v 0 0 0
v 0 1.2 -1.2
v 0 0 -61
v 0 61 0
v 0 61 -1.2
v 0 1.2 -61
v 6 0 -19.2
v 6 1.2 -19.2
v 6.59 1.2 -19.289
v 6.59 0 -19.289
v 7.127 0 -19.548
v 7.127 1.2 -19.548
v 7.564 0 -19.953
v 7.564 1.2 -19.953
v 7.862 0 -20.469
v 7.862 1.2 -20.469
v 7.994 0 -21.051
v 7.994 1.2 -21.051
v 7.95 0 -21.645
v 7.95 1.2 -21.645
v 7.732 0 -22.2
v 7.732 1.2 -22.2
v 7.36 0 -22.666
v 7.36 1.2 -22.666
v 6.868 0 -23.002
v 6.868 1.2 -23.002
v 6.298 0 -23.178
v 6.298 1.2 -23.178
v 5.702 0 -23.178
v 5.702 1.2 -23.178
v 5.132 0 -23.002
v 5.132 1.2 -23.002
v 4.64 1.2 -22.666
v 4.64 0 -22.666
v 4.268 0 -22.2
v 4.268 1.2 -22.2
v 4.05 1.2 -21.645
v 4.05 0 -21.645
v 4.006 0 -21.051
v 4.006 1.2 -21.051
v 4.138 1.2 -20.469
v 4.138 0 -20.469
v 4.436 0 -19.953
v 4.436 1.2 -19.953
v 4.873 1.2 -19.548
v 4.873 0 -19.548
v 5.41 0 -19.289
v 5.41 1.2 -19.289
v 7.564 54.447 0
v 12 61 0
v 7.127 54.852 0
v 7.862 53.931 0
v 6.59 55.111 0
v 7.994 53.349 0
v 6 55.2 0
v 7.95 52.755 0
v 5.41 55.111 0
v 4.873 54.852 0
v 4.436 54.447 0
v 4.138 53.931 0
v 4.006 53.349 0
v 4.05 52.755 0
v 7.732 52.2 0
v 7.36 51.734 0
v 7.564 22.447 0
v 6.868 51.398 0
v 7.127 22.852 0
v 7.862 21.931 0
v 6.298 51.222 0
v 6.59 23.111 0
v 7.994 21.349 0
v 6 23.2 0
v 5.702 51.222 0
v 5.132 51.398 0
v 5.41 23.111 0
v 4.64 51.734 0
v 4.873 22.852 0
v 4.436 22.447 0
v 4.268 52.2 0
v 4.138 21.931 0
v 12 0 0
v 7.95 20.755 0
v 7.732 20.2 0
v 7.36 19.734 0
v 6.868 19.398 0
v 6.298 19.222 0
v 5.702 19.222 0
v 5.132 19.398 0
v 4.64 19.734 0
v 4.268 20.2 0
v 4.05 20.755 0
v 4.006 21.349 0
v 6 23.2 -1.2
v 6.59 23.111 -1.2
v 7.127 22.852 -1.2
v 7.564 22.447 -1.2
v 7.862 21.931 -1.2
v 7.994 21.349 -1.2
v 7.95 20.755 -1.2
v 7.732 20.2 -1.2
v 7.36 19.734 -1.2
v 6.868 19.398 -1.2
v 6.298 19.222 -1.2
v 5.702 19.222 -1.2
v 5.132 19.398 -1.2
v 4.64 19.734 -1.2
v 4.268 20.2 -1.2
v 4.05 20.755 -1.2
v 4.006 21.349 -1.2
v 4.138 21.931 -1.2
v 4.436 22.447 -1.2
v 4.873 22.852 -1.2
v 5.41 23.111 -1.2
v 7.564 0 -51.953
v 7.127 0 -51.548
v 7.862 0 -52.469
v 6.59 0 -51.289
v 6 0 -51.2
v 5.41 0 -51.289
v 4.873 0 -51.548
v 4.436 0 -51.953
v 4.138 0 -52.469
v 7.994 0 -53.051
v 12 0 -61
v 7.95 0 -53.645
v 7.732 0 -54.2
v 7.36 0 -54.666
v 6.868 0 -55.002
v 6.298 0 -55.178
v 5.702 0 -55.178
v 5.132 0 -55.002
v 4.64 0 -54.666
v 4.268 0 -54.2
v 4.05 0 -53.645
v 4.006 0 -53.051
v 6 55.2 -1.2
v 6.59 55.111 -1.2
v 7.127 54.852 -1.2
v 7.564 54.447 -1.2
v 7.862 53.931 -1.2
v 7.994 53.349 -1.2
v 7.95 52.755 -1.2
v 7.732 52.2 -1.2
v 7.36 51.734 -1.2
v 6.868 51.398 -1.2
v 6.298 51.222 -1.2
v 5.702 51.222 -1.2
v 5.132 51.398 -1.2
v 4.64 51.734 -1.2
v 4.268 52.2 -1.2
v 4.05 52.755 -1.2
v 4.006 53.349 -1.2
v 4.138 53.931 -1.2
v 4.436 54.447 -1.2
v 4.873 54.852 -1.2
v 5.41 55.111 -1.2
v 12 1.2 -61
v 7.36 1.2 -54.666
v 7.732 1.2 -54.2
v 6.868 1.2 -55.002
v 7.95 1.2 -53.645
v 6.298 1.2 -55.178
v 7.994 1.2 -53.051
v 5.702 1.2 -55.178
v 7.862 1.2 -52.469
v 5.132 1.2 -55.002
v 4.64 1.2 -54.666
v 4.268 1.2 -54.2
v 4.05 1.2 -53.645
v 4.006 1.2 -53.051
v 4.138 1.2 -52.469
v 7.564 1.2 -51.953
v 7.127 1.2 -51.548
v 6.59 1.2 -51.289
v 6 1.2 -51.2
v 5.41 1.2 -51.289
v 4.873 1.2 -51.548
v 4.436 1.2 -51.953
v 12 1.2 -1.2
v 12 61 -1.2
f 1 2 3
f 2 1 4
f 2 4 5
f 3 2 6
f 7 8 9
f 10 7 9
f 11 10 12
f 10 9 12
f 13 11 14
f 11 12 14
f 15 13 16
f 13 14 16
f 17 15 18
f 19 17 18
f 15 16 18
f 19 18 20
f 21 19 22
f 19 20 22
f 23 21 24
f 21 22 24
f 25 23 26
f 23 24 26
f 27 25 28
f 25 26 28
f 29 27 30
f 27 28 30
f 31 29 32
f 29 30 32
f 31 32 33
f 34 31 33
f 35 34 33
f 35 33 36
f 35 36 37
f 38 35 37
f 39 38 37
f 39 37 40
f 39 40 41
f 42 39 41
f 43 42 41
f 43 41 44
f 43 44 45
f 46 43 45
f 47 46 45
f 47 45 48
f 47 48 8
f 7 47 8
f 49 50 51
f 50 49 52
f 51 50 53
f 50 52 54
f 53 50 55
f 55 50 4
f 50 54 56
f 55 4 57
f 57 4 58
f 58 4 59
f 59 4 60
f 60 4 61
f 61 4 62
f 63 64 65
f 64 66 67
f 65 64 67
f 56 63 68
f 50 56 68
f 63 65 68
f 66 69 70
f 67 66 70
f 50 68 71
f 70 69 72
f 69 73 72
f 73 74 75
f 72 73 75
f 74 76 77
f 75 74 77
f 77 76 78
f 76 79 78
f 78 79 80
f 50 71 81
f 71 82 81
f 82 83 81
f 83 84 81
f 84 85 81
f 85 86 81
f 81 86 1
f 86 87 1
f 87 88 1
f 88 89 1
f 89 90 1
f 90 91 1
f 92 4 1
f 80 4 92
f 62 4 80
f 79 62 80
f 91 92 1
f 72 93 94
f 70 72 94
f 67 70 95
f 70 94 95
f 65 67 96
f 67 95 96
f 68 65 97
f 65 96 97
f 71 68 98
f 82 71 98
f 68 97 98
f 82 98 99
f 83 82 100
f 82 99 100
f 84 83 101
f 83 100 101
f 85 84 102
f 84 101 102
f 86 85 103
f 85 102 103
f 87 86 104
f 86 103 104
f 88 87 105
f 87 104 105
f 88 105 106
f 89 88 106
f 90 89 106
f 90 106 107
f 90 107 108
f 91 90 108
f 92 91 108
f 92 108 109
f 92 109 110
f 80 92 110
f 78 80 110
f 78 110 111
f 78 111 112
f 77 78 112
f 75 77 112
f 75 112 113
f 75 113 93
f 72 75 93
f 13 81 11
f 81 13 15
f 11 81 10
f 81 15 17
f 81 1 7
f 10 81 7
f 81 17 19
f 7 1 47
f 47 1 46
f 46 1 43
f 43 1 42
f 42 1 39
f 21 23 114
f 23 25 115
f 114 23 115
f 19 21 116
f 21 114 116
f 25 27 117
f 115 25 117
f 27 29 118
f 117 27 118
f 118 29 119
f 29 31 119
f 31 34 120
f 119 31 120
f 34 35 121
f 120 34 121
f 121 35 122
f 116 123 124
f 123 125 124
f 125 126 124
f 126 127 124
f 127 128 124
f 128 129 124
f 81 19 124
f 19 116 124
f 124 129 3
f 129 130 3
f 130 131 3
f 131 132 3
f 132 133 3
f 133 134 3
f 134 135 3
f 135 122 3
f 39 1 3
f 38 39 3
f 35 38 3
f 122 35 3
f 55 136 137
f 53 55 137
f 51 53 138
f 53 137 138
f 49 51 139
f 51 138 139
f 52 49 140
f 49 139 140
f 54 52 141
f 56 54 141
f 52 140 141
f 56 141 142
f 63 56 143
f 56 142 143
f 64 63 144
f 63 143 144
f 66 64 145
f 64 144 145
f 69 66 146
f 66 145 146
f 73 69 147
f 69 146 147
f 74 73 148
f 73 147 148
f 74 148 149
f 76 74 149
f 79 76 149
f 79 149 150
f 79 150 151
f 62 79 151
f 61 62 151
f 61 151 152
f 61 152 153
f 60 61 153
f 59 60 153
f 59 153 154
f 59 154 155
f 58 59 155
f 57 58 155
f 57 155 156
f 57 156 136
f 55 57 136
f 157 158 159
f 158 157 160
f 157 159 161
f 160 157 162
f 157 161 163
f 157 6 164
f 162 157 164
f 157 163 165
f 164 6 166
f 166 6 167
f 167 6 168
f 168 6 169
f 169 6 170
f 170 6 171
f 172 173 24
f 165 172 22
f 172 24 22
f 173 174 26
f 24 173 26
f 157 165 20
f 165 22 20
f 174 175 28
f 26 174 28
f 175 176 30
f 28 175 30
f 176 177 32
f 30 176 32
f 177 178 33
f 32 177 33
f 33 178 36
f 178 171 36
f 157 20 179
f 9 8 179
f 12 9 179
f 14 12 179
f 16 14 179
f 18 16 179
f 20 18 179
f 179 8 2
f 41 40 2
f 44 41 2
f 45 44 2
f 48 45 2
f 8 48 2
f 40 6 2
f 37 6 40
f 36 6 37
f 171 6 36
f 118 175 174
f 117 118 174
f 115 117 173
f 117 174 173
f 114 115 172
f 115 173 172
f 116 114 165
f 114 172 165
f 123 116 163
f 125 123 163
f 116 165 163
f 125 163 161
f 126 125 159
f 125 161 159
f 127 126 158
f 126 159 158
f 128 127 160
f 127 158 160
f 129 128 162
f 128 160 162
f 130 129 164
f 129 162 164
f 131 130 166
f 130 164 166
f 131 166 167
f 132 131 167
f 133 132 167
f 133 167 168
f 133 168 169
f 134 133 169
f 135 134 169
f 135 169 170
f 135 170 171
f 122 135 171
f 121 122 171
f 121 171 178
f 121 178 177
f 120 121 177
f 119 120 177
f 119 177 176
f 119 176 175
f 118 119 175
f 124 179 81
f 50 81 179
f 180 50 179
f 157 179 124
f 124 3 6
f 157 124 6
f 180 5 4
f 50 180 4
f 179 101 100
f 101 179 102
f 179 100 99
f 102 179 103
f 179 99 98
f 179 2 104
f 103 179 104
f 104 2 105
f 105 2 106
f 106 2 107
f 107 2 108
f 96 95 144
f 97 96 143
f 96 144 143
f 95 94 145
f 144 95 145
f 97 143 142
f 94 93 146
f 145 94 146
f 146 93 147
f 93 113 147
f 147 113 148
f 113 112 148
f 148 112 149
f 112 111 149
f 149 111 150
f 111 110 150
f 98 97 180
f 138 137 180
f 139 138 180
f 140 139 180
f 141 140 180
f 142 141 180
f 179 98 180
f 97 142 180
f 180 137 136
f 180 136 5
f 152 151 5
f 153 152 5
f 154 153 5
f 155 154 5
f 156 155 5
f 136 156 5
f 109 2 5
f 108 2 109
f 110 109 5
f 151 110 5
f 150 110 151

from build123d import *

# Parameters (mm, degrees)
EXTRUDE_1_DEPTH     = 12
SKETCH_2_R          = 2
CUT_EXTRUDE_1_DEPTH = 12
SKETCH_3_R          = 2
CUT_EXTRUDE_2_DEPTH = 12


with BuildPart() as part:
    # 草图1 → 凸台-拉伸1 (new body)
    with BuildSketch(Plane(origin=(0, 0, 0), x_dir=(0, 0, -1), z_dir=(1, 0, 0))):
        Polygon((0, 0), (61, 0), (61, 1.2), (1.2, 1.2), (1.2, 61), (0, 61), align=None)
    extrude(amount=EXTRUDE_1_DEPTH)

    # 草图2 → 切除-拉伸1 (cut)
    with BuildSketch(Plane(origin=(0, 1.2, 0), x_dir=(1, 0, 0), z_dir=(0, 1, 0))):
        with Locations(Location((6, 21.2, 0), (0, 0, 270))):
            Circle(SKETCH_2_R)
        with Locations(Location((6, 53.2, 0), (0, 0, 270))):
            Circle(SKETCH_2_R)
    extrude(amount=-CUT_EXTRUDE_1_DEPTH, mode=Mode.SUBTRACT)

    # 草图3 → 切除-拉伸2 (cut)
    with BuildSketch(Plane(origin=(0, 0, -1.2), x_dir=(-1, 0, 0), z_dir=(0, 0, -1))):
        with Locations(Location((-6, 21.2, 0), (0, 0, 90))):
            Circle(SKETCH_3_R)
        with Locations(Location((-6, 53.2, 0), (0, 0, 90))):
            Circle(SKETCH_3_R)
    extrude(amount=-CUT_EXTRUDE_2_DEPTH, mode=Mode.SUBTRACT)


solid = part.part
